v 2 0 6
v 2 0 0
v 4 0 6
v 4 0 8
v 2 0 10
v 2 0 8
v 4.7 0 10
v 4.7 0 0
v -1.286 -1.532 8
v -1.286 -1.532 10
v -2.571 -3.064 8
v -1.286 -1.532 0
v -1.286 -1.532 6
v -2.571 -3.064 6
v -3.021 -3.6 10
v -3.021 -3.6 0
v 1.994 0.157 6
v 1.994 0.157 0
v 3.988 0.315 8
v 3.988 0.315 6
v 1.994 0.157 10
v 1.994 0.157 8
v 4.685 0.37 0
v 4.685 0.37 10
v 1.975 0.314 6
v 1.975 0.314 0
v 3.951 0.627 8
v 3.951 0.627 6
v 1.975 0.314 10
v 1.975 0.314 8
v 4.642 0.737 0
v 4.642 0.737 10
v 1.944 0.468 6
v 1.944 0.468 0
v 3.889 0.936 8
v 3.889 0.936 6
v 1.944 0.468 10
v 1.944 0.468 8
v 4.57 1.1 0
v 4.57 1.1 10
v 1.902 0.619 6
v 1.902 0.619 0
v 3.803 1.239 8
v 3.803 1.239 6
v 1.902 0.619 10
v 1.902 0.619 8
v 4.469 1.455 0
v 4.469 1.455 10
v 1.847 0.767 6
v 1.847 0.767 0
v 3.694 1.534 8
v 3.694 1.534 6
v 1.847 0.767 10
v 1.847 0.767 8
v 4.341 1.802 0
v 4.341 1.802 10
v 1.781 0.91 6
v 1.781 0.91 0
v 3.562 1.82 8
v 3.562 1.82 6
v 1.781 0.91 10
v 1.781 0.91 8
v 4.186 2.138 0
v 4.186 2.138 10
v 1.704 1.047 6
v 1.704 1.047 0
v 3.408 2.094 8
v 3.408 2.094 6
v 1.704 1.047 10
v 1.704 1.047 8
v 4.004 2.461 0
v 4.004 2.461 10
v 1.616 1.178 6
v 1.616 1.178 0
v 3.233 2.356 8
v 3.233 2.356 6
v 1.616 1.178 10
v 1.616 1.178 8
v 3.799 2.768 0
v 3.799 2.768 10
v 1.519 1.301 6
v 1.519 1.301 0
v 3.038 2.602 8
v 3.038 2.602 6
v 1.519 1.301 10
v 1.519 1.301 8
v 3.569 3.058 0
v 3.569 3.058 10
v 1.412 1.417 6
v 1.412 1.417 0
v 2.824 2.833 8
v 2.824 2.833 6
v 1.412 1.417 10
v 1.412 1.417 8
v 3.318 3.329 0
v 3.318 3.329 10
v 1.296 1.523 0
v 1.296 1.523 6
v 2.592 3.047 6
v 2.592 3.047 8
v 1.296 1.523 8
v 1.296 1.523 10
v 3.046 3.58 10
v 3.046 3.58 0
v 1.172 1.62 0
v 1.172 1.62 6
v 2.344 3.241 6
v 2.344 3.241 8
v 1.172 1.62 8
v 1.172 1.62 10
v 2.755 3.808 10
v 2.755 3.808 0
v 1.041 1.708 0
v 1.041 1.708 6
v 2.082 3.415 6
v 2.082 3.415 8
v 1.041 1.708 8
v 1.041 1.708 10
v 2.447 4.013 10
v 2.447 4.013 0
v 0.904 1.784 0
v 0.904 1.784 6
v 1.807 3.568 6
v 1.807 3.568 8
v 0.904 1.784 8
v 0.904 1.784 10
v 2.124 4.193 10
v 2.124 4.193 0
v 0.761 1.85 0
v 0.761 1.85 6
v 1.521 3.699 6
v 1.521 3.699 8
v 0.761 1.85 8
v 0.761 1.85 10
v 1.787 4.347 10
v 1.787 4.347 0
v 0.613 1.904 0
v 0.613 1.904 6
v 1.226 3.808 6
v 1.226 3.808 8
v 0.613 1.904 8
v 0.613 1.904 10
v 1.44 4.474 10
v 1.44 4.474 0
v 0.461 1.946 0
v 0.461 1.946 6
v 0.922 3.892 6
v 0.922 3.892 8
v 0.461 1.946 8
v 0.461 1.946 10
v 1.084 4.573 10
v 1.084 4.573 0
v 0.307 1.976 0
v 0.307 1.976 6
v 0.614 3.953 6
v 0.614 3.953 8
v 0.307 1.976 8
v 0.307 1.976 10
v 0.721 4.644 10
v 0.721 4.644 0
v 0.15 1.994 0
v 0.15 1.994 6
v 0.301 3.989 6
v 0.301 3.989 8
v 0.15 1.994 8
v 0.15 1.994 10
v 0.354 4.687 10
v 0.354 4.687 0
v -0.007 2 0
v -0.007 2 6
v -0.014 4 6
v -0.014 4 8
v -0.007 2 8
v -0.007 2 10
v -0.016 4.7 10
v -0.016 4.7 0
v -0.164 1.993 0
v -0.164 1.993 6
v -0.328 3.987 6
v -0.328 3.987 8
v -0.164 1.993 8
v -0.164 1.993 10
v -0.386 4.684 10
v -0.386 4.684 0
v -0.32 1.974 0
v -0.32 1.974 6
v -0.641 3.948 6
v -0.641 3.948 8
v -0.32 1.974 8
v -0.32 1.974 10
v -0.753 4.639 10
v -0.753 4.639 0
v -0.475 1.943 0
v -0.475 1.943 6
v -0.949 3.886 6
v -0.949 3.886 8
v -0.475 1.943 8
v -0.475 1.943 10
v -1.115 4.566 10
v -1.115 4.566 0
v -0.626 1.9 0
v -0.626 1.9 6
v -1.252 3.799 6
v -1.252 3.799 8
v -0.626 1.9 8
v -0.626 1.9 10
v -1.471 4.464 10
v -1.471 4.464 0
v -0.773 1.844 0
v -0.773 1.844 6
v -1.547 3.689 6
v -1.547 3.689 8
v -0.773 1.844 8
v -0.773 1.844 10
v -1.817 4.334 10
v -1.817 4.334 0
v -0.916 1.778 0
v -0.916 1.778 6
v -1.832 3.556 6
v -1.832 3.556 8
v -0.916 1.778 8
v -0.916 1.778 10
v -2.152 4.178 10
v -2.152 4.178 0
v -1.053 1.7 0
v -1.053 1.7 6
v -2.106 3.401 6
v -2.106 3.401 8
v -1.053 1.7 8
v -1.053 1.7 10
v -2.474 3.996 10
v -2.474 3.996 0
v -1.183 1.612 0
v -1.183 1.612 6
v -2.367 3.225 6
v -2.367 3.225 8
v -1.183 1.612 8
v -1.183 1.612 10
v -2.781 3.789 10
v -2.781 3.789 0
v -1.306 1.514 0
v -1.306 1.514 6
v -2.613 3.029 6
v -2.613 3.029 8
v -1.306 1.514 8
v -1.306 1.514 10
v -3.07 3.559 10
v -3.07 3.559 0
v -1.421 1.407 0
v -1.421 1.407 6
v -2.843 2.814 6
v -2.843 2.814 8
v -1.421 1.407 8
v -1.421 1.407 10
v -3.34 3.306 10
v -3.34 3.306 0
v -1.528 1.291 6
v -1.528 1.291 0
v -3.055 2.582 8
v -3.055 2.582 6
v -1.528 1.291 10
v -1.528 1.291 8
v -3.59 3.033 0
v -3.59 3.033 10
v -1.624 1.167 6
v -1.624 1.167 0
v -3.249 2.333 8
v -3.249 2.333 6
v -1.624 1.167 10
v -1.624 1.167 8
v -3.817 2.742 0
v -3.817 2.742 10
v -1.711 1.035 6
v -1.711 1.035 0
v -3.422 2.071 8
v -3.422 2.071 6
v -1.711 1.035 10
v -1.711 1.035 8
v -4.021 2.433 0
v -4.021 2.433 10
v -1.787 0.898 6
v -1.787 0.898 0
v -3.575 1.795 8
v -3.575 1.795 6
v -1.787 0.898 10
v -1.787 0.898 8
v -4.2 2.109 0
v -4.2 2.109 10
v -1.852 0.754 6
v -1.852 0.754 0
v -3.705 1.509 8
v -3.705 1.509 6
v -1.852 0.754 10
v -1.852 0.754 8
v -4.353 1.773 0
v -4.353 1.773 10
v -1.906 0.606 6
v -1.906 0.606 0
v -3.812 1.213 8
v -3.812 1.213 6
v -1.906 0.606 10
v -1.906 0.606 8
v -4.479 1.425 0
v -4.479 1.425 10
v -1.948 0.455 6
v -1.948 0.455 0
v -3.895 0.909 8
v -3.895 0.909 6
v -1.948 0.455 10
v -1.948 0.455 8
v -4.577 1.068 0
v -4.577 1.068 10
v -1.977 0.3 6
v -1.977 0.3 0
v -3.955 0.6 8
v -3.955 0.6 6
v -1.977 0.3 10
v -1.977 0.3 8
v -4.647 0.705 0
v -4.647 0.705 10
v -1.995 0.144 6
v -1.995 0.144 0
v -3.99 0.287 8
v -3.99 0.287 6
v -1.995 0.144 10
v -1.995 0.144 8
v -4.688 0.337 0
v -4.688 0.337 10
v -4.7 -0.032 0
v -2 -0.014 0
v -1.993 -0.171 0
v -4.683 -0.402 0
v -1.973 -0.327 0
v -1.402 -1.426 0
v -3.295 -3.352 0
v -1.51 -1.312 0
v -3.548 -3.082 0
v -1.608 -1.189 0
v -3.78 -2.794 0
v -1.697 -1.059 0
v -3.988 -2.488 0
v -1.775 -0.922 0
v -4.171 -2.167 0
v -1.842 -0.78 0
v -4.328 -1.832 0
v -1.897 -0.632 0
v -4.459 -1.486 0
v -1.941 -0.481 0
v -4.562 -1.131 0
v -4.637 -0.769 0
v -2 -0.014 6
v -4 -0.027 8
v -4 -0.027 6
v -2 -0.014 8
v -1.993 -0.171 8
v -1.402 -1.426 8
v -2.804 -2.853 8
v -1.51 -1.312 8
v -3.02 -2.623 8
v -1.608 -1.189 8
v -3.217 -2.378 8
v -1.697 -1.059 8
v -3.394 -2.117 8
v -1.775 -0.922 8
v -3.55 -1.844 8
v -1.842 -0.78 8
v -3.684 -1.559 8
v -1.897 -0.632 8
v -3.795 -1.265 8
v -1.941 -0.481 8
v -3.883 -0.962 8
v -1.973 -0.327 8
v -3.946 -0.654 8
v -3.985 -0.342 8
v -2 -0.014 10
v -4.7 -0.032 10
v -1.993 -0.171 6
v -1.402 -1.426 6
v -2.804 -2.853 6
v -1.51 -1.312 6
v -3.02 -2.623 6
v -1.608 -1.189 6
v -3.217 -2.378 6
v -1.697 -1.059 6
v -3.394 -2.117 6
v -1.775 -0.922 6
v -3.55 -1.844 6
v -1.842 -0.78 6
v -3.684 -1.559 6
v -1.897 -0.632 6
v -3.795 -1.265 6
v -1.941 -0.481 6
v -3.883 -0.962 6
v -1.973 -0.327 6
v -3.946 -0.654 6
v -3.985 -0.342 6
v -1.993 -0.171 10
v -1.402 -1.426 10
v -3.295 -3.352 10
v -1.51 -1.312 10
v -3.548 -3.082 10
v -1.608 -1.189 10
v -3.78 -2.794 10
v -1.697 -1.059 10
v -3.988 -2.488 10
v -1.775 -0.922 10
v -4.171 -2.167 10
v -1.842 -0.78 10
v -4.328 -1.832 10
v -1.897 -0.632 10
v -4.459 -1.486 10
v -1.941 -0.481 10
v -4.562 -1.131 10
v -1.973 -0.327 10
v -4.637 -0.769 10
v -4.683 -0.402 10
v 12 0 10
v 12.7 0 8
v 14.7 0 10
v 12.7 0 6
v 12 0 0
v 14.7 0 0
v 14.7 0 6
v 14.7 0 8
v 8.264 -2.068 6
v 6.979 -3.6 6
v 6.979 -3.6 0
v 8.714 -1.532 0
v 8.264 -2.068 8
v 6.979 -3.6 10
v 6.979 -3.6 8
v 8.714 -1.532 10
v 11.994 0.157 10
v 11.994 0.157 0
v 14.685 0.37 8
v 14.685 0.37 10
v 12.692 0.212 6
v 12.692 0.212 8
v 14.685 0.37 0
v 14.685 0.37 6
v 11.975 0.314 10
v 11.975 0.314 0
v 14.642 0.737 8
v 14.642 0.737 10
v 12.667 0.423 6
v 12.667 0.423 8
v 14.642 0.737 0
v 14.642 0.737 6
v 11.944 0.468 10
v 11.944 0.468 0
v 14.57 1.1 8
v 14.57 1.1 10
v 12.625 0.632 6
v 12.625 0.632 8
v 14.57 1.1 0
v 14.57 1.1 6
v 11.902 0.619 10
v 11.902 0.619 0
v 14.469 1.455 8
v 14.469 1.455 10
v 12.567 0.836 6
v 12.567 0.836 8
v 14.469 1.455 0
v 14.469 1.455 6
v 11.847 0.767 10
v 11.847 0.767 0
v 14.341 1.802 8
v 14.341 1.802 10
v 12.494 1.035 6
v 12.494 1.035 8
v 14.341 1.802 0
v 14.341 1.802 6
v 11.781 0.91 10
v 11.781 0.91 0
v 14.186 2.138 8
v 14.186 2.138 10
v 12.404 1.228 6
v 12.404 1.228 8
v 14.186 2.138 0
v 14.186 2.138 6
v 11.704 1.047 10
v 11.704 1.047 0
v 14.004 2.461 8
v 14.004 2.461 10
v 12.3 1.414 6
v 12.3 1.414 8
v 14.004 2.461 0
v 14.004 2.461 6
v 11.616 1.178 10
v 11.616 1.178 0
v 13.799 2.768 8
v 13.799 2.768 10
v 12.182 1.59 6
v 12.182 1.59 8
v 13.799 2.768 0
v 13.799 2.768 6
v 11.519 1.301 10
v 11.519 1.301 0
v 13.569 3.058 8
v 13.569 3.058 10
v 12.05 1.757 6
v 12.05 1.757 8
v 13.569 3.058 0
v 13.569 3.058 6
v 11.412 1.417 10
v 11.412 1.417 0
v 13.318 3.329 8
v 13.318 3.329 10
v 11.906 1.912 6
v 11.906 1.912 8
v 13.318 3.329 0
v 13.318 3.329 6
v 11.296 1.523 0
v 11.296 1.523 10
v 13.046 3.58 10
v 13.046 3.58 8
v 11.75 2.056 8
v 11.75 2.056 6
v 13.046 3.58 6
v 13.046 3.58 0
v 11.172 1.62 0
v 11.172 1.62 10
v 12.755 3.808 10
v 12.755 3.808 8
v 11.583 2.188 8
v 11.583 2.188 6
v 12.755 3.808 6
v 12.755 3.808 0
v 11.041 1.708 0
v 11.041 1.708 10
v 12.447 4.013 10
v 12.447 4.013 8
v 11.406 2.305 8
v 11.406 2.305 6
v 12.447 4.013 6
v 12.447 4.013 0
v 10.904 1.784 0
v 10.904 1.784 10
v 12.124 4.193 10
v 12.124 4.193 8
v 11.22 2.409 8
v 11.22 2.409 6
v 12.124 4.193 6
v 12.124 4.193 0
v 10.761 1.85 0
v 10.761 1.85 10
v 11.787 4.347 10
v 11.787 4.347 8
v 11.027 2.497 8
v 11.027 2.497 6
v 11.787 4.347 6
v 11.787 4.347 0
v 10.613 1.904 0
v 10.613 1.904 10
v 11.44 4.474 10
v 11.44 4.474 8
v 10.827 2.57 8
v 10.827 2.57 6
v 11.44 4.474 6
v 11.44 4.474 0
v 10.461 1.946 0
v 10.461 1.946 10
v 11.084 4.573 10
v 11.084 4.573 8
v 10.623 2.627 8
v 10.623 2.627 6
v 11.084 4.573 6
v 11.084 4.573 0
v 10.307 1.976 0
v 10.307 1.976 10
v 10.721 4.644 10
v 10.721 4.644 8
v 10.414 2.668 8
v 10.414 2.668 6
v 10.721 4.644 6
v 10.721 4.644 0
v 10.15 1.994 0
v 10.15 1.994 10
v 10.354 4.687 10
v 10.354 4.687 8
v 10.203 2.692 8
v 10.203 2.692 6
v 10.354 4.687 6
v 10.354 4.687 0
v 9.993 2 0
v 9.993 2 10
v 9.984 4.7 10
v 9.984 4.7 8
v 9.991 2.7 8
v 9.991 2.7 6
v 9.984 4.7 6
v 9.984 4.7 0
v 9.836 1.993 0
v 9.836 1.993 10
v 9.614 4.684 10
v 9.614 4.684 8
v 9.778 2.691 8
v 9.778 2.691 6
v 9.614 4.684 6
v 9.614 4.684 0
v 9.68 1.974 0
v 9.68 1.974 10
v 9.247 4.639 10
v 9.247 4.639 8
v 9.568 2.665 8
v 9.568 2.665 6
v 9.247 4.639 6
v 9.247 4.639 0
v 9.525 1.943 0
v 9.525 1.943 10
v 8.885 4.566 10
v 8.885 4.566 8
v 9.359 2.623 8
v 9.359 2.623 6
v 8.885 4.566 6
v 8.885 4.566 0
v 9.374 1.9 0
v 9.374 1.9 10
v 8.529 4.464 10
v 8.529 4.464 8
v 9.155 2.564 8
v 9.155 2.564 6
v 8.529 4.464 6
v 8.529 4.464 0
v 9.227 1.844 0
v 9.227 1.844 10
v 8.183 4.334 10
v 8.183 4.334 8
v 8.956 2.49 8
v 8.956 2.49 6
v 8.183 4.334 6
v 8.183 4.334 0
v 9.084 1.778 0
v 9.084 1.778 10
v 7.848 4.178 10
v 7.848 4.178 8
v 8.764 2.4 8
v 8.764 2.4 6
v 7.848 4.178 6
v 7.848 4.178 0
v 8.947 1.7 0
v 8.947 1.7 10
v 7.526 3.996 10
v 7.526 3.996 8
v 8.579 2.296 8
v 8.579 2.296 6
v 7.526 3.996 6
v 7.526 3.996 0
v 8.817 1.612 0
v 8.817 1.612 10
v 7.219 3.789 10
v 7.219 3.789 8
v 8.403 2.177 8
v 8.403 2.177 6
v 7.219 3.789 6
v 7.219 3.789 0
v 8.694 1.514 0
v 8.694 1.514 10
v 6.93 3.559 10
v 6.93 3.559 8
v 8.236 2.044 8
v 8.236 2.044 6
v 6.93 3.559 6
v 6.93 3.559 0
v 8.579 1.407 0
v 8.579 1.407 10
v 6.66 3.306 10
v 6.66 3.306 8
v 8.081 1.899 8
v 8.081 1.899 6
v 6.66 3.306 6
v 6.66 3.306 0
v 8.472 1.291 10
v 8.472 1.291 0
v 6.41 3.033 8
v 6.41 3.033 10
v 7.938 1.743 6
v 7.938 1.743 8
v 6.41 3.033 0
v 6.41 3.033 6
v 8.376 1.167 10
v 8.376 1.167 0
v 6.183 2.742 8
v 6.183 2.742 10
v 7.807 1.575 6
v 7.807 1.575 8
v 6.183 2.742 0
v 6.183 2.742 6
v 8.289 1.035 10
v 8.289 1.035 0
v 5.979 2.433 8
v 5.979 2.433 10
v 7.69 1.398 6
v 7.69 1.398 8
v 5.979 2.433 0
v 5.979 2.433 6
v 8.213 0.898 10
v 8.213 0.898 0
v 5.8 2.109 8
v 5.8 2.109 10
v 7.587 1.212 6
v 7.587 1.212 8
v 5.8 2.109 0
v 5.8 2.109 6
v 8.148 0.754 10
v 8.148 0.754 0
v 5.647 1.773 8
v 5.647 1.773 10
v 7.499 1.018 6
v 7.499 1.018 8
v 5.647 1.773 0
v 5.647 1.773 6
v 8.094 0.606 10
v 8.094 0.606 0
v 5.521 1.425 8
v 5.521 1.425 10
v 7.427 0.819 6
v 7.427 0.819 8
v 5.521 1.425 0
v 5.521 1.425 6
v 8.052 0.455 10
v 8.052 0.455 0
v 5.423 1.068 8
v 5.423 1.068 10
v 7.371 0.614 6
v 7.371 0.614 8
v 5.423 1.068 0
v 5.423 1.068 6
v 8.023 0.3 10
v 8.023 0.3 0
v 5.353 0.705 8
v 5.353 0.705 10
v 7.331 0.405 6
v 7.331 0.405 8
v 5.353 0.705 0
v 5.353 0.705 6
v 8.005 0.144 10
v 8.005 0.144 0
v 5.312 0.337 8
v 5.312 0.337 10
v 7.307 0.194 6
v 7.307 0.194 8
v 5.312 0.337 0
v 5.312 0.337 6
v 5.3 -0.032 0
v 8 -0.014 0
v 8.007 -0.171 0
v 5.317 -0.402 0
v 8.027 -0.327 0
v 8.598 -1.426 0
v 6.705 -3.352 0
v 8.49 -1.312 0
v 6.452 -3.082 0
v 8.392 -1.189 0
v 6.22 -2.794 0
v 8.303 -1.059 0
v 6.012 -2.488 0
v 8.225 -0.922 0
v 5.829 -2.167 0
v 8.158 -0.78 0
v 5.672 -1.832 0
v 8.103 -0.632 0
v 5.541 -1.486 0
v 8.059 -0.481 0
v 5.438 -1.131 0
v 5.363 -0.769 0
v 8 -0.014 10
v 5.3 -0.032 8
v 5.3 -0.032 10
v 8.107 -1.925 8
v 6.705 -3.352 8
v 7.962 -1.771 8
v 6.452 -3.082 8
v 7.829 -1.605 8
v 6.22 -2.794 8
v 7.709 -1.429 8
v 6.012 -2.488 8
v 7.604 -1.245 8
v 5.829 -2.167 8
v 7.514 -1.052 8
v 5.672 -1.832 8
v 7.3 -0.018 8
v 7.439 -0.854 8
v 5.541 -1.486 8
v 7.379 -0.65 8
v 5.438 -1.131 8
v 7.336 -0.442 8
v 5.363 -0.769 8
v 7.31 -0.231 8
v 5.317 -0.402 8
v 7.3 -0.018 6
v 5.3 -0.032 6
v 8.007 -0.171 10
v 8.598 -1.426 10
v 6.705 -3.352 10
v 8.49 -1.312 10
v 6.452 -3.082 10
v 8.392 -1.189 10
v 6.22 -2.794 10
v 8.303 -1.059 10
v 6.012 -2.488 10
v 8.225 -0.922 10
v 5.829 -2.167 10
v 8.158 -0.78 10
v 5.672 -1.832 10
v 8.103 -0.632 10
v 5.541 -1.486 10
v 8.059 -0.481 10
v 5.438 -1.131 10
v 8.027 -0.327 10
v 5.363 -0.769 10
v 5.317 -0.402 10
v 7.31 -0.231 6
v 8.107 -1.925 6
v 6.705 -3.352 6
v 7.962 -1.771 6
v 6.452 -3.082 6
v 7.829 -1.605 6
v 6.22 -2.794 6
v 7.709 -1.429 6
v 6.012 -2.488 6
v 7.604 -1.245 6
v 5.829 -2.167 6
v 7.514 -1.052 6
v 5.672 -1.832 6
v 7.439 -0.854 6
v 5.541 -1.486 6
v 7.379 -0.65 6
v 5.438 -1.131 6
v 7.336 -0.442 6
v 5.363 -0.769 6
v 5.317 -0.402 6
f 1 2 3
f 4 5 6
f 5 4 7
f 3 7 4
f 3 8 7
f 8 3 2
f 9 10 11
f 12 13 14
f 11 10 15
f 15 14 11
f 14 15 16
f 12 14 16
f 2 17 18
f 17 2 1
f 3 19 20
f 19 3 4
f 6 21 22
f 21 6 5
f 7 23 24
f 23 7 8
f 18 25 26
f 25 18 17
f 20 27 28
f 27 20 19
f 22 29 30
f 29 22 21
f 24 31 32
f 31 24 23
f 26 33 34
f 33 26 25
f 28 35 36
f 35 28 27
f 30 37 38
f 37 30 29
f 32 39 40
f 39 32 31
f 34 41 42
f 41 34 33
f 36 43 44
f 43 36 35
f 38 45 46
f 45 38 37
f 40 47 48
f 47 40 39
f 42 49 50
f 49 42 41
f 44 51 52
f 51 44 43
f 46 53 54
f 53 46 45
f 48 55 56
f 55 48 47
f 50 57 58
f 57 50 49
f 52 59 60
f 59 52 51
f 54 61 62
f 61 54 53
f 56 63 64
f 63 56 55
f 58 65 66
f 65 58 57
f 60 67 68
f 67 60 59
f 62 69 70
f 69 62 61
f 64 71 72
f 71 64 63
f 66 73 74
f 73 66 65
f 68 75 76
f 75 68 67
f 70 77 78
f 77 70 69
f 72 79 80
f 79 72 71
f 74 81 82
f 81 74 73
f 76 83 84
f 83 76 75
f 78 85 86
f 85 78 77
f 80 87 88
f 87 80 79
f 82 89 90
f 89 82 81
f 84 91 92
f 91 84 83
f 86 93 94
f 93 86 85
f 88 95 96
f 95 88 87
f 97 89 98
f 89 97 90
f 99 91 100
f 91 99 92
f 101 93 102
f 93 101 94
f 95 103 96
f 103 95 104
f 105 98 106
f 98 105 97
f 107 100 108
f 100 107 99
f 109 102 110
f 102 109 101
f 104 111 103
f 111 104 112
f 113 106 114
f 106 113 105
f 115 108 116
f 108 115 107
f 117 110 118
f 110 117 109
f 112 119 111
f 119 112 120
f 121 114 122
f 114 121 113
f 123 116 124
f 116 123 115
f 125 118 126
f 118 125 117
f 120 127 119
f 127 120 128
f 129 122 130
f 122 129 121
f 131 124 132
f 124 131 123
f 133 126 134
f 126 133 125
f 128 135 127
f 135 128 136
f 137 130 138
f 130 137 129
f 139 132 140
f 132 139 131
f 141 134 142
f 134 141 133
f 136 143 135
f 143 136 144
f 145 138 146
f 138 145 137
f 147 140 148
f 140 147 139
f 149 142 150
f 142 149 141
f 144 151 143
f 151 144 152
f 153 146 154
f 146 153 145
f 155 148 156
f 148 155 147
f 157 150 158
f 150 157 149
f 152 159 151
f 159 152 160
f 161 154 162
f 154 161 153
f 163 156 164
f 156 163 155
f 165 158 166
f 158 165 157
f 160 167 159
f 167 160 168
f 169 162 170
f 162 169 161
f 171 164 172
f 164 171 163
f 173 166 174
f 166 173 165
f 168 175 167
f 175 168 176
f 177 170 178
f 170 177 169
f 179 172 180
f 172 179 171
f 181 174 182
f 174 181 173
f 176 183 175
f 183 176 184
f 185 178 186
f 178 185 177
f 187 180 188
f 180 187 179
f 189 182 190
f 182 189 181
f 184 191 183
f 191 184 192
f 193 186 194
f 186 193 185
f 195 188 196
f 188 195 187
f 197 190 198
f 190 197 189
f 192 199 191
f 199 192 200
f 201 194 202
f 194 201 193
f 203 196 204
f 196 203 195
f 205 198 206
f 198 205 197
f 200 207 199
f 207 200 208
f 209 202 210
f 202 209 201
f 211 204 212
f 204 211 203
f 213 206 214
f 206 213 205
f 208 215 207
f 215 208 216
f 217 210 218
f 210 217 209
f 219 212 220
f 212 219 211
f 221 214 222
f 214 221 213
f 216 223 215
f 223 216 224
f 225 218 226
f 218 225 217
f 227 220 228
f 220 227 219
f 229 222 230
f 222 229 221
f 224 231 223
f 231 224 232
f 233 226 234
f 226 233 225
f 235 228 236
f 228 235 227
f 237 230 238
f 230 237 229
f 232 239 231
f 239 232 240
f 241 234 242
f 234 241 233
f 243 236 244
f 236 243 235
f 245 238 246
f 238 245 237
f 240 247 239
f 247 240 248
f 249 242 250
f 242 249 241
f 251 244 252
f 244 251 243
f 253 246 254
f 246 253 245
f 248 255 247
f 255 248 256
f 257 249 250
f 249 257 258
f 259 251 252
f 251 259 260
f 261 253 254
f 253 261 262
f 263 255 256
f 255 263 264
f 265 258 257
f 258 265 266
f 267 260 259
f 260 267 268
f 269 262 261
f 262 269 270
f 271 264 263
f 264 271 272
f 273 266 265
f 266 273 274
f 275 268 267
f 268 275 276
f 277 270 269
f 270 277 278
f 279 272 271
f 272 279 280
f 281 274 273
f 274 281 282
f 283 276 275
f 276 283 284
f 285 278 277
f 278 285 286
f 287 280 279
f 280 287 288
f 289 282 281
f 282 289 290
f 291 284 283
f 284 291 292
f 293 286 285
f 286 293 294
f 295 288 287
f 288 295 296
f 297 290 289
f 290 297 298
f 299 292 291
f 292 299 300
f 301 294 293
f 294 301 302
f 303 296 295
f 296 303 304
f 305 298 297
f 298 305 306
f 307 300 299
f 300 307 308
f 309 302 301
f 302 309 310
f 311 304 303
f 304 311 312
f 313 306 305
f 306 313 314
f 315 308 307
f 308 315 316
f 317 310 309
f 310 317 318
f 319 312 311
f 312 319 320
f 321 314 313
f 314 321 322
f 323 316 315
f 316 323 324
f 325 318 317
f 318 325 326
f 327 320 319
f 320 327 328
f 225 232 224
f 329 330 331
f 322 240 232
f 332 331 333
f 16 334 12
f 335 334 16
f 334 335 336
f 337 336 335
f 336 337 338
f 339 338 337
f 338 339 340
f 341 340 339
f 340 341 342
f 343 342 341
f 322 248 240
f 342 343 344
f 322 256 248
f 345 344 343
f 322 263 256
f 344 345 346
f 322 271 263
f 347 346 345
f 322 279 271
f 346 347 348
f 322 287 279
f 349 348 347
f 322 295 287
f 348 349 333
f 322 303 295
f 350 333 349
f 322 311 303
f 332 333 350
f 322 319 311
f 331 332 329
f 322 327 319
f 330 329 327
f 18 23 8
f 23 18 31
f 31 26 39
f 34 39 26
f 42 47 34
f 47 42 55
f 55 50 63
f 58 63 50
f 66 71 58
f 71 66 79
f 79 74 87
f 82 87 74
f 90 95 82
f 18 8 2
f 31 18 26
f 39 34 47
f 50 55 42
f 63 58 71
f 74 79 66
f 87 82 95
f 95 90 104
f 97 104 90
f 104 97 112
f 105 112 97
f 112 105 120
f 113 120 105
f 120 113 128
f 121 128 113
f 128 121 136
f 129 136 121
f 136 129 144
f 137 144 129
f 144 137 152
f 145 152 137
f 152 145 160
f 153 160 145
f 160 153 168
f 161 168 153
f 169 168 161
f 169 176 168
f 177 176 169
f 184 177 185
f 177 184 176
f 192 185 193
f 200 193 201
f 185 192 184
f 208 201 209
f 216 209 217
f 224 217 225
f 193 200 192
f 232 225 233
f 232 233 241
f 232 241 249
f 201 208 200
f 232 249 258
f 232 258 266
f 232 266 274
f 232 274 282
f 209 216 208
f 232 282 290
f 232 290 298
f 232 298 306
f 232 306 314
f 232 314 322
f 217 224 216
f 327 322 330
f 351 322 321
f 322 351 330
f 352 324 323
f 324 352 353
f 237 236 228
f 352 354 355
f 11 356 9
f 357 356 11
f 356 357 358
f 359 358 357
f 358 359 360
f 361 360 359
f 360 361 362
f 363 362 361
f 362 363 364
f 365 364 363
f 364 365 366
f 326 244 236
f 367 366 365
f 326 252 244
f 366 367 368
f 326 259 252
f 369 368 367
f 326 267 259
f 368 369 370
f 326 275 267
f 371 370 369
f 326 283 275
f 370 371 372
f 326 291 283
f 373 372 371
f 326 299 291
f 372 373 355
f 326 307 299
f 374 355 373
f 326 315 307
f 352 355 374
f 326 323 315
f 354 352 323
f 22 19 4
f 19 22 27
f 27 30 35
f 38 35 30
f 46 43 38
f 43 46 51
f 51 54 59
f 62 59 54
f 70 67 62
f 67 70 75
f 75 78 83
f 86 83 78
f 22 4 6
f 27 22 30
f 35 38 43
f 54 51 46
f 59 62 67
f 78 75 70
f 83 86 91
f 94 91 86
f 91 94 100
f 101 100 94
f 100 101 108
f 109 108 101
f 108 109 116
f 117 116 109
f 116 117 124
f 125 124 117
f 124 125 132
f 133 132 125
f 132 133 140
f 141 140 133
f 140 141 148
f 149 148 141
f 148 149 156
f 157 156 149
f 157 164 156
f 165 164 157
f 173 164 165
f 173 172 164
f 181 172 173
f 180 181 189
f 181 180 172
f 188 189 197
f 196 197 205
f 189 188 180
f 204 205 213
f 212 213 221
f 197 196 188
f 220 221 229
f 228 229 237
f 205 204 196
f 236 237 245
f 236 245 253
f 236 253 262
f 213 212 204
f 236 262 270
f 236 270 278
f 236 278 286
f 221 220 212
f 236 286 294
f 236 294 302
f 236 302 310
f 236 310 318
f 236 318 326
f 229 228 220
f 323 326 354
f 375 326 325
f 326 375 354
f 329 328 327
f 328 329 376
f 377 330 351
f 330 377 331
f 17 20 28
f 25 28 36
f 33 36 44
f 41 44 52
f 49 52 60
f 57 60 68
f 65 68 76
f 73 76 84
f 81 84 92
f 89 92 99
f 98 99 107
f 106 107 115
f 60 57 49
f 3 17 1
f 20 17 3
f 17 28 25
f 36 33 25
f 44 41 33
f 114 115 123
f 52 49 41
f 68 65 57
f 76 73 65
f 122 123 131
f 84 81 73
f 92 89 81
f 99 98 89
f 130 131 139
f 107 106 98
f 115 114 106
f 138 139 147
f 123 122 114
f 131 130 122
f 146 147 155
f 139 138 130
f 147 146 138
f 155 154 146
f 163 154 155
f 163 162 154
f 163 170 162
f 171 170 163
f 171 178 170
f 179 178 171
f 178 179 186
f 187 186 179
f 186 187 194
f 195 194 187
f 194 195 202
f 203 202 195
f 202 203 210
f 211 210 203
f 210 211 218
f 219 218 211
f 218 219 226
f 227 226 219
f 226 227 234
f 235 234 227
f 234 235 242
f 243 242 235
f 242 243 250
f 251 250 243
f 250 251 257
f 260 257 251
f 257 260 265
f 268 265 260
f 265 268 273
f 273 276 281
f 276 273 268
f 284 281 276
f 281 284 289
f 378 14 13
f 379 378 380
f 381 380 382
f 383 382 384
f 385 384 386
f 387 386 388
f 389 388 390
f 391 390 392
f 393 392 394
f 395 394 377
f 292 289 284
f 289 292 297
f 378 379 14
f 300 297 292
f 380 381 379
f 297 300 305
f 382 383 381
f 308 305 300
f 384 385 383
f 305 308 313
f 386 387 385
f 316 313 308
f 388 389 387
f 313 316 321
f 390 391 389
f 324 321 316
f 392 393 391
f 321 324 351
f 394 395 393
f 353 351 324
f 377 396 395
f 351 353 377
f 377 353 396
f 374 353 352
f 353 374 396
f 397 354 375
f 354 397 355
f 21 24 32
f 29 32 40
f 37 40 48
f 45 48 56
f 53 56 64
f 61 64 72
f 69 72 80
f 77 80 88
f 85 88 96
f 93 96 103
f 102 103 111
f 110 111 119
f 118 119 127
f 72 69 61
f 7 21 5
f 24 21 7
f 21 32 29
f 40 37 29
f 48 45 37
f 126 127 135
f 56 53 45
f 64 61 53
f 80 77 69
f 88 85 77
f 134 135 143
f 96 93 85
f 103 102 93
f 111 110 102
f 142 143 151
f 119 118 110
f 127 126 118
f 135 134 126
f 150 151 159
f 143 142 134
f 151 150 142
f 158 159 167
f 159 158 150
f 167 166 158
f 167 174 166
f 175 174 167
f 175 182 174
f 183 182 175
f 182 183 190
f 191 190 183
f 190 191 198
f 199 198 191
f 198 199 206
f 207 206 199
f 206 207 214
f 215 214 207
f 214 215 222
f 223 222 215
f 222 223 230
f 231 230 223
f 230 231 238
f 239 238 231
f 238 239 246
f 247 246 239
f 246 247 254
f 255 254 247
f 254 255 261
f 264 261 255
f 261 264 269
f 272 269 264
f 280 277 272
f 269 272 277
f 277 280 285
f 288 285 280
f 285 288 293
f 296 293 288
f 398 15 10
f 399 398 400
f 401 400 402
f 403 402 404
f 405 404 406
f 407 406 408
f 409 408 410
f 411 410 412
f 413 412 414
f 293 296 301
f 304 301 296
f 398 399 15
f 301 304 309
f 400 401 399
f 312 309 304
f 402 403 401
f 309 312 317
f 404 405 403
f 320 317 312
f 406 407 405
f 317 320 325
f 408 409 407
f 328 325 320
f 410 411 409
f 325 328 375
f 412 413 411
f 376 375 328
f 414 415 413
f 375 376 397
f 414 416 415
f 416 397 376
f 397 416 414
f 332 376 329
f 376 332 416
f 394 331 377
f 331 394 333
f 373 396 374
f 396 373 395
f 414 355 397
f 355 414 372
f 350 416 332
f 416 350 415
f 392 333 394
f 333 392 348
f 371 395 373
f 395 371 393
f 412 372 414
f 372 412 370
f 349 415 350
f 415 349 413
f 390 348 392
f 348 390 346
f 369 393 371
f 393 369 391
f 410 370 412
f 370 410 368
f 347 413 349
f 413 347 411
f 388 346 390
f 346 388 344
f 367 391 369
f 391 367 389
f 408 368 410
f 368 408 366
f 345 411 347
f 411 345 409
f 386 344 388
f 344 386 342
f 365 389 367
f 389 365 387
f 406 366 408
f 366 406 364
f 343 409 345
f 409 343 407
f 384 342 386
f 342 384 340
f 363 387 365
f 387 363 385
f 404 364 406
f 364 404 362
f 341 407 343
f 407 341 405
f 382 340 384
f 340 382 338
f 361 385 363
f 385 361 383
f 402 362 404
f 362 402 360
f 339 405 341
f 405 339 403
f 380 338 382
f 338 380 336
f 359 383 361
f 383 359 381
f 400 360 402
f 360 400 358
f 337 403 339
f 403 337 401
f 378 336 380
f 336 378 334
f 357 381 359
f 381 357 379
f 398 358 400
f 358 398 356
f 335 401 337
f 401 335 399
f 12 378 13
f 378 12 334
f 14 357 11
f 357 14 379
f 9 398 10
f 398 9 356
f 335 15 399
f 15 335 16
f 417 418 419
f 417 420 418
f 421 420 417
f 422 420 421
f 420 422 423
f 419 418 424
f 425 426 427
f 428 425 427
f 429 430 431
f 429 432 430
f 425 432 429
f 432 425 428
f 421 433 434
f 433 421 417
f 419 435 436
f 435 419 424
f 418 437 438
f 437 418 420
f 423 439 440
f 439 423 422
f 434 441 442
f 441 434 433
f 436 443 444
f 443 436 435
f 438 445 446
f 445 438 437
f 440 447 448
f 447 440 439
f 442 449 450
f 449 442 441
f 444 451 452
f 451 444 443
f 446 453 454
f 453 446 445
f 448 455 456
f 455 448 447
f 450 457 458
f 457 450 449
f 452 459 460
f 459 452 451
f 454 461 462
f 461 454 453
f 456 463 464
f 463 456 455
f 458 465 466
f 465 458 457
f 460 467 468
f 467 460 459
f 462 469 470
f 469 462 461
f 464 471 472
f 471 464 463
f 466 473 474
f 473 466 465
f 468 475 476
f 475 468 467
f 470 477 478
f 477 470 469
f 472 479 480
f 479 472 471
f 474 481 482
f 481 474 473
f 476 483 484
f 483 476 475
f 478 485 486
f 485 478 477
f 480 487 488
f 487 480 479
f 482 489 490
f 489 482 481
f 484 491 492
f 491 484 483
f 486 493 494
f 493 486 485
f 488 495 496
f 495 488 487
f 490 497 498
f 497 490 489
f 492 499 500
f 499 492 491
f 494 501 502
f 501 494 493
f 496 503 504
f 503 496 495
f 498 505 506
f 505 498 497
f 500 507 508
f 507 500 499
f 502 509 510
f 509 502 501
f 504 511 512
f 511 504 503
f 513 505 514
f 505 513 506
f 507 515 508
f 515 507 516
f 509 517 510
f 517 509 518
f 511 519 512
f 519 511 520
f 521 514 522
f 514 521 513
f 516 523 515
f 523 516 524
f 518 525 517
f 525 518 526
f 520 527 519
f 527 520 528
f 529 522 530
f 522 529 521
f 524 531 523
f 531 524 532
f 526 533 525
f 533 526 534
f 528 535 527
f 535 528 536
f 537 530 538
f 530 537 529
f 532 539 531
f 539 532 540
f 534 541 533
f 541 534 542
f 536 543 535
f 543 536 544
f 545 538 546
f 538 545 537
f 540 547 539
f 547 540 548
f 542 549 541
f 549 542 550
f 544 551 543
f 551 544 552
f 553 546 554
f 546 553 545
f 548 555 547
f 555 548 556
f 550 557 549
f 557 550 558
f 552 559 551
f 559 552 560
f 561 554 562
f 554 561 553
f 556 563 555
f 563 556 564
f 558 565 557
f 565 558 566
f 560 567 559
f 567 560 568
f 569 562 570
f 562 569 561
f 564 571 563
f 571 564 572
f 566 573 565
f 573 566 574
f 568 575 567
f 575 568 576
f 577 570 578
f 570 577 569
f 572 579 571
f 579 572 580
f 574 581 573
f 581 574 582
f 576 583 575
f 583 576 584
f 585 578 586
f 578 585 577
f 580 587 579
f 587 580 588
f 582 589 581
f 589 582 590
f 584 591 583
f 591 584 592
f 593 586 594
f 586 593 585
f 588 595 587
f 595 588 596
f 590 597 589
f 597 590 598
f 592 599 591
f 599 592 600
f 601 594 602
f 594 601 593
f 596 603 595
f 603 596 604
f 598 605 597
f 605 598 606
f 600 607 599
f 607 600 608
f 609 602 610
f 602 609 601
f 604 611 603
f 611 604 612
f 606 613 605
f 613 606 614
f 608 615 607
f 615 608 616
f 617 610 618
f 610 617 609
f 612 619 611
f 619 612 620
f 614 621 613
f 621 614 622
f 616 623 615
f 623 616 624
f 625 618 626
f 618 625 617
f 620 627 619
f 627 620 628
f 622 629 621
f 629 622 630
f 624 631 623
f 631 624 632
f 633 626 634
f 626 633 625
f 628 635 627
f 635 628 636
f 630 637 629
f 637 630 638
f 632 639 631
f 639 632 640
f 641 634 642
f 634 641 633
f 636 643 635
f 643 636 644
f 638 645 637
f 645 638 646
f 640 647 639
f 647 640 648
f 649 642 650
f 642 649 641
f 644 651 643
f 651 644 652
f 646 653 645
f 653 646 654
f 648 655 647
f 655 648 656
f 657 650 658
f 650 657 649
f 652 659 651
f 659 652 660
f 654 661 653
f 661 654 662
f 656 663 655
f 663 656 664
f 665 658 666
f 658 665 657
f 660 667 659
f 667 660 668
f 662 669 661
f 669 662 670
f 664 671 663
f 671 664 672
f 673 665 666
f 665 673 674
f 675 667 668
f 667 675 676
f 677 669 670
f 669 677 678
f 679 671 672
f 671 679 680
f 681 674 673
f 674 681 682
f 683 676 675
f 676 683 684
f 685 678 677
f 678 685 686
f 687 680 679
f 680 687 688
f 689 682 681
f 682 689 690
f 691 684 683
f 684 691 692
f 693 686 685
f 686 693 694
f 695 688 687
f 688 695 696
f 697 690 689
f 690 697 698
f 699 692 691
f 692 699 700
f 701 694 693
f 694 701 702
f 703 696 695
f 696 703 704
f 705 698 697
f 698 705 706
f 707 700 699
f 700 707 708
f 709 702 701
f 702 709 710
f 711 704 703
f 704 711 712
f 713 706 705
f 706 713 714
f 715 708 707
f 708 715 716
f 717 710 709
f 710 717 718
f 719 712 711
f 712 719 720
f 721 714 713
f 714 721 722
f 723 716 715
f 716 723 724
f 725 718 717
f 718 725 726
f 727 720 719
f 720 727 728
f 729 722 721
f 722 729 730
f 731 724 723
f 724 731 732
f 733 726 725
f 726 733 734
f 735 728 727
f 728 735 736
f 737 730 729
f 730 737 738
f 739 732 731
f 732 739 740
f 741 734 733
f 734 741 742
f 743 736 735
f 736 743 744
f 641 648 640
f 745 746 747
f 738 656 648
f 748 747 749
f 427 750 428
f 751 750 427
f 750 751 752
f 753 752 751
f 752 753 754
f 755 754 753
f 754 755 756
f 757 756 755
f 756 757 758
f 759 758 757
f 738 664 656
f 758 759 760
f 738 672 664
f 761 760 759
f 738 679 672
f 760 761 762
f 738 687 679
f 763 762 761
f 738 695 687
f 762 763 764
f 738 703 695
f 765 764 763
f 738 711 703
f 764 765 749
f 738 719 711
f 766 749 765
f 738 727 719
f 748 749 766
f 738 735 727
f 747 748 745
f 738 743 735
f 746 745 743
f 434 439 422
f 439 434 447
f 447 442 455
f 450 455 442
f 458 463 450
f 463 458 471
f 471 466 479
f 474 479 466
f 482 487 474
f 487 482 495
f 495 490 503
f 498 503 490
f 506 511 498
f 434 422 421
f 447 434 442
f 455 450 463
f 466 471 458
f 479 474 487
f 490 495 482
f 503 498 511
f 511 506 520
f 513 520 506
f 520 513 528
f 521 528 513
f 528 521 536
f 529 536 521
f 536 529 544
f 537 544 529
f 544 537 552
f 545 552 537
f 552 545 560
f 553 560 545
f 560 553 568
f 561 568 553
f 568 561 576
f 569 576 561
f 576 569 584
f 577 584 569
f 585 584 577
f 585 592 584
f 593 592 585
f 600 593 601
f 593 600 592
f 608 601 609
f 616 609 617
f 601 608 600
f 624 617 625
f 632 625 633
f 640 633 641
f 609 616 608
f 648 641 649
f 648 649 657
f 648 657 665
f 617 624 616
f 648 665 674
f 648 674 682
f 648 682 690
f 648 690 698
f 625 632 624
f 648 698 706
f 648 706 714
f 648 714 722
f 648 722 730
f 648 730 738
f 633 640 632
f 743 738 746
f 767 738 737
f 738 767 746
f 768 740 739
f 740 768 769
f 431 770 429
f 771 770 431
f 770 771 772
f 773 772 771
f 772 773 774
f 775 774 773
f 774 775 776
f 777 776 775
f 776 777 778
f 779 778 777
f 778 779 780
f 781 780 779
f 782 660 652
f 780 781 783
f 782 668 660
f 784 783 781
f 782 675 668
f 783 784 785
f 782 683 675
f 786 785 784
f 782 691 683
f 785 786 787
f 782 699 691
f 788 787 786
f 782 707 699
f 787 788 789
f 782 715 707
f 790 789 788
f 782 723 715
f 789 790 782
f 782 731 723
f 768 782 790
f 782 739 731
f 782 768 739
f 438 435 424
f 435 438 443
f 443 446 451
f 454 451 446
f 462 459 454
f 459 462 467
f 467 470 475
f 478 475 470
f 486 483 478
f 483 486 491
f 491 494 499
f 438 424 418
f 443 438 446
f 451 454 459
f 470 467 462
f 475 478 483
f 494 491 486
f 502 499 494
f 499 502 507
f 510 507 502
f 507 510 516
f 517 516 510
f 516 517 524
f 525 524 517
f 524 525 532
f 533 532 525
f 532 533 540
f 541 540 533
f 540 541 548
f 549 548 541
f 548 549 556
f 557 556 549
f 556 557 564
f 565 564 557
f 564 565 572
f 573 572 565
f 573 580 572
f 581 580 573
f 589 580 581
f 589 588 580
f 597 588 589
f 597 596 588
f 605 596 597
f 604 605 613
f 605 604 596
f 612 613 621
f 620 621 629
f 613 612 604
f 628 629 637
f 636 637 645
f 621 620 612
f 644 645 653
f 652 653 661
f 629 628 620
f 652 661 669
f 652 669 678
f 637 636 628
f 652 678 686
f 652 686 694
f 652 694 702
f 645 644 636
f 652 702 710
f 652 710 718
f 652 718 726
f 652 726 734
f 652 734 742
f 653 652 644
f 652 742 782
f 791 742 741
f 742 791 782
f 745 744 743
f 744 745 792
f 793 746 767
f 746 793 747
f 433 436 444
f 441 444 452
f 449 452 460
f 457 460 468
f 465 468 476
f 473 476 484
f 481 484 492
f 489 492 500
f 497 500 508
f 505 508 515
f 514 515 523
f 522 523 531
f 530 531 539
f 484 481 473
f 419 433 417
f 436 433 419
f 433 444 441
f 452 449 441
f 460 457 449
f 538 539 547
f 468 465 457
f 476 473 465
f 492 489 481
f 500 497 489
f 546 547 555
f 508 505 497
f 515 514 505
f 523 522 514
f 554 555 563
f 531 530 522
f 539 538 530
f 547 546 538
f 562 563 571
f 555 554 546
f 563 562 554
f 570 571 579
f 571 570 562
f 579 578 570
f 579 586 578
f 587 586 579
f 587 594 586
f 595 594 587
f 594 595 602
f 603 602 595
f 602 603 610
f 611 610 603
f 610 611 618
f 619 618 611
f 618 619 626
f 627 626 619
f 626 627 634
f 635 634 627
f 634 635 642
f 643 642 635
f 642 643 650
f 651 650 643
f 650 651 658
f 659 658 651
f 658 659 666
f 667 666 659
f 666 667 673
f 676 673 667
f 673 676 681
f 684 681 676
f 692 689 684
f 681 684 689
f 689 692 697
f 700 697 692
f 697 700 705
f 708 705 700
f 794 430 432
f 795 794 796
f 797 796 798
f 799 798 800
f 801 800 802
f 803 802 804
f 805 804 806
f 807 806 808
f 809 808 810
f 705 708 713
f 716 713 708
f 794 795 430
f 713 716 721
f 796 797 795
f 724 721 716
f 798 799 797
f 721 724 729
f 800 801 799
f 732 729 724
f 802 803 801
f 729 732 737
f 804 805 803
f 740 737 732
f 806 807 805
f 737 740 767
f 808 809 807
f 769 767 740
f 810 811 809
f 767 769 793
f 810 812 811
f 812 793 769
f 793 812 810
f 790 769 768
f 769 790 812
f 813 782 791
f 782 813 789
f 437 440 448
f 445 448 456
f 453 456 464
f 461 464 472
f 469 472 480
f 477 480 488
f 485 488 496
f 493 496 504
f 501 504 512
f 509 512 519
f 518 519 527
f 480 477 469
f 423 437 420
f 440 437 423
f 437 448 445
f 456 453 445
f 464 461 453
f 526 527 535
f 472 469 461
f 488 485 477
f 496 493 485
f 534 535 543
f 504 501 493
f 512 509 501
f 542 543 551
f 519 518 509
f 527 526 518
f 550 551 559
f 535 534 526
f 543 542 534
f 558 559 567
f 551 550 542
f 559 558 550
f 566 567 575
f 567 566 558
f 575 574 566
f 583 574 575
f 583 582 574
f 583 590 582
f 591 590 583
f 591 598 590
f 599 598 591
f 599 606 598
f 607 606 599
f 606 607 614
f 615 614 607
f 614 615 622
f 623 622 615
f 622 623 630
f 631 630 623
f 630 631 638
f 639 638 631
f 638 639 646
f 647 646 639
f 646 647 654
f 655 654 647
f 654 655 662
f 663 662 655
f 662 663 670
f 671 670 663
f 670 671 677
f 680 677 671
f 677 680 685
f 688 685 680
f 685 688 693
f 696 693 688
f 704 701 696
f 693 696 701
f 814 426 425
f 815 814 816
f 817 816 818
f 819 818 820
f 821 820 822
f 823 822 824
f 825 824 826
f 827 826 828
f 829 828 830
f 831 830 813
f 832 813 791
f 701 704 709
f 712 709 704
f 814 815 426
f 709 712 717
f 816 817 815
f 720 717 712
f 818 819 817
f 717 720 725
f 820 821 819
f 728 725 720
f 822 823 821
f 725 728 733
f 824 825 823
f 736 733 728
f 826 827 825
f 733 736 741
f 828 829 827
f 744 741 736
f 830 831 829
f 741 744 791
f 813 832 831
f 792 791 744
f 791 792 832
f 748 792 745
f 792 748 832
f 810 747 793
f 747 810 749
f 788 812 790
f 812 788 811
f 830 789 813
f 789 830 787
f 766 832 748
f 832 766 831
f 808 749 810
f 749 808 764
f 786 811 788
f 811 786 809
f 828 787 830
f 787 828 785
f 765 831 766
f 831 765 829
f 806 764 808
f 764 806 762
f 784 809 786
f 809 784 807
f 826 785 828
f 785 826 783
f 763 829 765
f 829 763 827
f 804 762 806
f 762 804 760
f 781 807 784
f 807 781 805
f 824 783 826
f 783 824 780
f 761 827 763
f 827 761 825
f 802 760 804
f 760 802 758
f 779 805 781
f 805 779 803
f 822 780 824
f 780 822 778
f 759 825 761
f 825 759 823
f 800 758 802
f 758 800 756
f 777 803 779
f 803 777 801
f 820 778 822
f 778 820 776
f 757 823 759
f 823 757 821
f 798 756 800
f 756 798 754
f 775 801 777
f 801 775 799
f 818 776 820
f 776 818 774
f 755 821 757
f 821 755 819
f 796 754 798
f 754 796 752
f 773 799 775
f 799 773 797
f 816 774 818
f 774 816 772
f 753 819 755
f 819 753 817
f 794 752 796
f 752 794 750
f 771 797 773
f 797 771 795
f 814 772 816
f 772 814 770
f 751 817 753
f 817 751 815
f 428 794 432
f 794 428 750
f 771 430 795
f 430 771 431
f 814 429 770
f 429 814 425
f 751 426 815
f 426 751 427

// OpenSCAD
module interior_groove(alpha=360) {
    L0=2;
    L=2;
    L1=0.7;
    G=2;
    G1=6;
    G2=2;

    rotate_extrude(angle=alpha, $fn=80)
    // mirror([-1,0,0]) translate([-(L0+L+L1+L0),0,0])
    polygon(points=[
    [L0,0],
    [L0,G1],
    [L0+L,G1],
    [L0+L,G+G1],
    [L0,G+G1],
    [L0,G+G1+G2],
    [L0+L+L1,G+G1+G2],
    [L0+L+L1,0]
    ]);
}

module exterior_groove(alpha=360) {
    L0=2;
    L=2;
    L1=0.7;
    G=2;
    G1=6;
    G2=2;

    rotate_extrude(angle=alpha, $fn=80)
    polygon(points=[
    [L0,0],
    [L0,G1+G+G2],
    [L0+L1+L,G1+G+G2],
    [L0+L1+L,G+G1],
    [L0+L1,G+G1],
    [L0+L1,G1],
    [L0+L1+L,G1],
    [L0+L1+L,0]
    ]);
}


interior_groove(alpha=230);
translate([10,0,0]) exterior_groove(alpha=230);
